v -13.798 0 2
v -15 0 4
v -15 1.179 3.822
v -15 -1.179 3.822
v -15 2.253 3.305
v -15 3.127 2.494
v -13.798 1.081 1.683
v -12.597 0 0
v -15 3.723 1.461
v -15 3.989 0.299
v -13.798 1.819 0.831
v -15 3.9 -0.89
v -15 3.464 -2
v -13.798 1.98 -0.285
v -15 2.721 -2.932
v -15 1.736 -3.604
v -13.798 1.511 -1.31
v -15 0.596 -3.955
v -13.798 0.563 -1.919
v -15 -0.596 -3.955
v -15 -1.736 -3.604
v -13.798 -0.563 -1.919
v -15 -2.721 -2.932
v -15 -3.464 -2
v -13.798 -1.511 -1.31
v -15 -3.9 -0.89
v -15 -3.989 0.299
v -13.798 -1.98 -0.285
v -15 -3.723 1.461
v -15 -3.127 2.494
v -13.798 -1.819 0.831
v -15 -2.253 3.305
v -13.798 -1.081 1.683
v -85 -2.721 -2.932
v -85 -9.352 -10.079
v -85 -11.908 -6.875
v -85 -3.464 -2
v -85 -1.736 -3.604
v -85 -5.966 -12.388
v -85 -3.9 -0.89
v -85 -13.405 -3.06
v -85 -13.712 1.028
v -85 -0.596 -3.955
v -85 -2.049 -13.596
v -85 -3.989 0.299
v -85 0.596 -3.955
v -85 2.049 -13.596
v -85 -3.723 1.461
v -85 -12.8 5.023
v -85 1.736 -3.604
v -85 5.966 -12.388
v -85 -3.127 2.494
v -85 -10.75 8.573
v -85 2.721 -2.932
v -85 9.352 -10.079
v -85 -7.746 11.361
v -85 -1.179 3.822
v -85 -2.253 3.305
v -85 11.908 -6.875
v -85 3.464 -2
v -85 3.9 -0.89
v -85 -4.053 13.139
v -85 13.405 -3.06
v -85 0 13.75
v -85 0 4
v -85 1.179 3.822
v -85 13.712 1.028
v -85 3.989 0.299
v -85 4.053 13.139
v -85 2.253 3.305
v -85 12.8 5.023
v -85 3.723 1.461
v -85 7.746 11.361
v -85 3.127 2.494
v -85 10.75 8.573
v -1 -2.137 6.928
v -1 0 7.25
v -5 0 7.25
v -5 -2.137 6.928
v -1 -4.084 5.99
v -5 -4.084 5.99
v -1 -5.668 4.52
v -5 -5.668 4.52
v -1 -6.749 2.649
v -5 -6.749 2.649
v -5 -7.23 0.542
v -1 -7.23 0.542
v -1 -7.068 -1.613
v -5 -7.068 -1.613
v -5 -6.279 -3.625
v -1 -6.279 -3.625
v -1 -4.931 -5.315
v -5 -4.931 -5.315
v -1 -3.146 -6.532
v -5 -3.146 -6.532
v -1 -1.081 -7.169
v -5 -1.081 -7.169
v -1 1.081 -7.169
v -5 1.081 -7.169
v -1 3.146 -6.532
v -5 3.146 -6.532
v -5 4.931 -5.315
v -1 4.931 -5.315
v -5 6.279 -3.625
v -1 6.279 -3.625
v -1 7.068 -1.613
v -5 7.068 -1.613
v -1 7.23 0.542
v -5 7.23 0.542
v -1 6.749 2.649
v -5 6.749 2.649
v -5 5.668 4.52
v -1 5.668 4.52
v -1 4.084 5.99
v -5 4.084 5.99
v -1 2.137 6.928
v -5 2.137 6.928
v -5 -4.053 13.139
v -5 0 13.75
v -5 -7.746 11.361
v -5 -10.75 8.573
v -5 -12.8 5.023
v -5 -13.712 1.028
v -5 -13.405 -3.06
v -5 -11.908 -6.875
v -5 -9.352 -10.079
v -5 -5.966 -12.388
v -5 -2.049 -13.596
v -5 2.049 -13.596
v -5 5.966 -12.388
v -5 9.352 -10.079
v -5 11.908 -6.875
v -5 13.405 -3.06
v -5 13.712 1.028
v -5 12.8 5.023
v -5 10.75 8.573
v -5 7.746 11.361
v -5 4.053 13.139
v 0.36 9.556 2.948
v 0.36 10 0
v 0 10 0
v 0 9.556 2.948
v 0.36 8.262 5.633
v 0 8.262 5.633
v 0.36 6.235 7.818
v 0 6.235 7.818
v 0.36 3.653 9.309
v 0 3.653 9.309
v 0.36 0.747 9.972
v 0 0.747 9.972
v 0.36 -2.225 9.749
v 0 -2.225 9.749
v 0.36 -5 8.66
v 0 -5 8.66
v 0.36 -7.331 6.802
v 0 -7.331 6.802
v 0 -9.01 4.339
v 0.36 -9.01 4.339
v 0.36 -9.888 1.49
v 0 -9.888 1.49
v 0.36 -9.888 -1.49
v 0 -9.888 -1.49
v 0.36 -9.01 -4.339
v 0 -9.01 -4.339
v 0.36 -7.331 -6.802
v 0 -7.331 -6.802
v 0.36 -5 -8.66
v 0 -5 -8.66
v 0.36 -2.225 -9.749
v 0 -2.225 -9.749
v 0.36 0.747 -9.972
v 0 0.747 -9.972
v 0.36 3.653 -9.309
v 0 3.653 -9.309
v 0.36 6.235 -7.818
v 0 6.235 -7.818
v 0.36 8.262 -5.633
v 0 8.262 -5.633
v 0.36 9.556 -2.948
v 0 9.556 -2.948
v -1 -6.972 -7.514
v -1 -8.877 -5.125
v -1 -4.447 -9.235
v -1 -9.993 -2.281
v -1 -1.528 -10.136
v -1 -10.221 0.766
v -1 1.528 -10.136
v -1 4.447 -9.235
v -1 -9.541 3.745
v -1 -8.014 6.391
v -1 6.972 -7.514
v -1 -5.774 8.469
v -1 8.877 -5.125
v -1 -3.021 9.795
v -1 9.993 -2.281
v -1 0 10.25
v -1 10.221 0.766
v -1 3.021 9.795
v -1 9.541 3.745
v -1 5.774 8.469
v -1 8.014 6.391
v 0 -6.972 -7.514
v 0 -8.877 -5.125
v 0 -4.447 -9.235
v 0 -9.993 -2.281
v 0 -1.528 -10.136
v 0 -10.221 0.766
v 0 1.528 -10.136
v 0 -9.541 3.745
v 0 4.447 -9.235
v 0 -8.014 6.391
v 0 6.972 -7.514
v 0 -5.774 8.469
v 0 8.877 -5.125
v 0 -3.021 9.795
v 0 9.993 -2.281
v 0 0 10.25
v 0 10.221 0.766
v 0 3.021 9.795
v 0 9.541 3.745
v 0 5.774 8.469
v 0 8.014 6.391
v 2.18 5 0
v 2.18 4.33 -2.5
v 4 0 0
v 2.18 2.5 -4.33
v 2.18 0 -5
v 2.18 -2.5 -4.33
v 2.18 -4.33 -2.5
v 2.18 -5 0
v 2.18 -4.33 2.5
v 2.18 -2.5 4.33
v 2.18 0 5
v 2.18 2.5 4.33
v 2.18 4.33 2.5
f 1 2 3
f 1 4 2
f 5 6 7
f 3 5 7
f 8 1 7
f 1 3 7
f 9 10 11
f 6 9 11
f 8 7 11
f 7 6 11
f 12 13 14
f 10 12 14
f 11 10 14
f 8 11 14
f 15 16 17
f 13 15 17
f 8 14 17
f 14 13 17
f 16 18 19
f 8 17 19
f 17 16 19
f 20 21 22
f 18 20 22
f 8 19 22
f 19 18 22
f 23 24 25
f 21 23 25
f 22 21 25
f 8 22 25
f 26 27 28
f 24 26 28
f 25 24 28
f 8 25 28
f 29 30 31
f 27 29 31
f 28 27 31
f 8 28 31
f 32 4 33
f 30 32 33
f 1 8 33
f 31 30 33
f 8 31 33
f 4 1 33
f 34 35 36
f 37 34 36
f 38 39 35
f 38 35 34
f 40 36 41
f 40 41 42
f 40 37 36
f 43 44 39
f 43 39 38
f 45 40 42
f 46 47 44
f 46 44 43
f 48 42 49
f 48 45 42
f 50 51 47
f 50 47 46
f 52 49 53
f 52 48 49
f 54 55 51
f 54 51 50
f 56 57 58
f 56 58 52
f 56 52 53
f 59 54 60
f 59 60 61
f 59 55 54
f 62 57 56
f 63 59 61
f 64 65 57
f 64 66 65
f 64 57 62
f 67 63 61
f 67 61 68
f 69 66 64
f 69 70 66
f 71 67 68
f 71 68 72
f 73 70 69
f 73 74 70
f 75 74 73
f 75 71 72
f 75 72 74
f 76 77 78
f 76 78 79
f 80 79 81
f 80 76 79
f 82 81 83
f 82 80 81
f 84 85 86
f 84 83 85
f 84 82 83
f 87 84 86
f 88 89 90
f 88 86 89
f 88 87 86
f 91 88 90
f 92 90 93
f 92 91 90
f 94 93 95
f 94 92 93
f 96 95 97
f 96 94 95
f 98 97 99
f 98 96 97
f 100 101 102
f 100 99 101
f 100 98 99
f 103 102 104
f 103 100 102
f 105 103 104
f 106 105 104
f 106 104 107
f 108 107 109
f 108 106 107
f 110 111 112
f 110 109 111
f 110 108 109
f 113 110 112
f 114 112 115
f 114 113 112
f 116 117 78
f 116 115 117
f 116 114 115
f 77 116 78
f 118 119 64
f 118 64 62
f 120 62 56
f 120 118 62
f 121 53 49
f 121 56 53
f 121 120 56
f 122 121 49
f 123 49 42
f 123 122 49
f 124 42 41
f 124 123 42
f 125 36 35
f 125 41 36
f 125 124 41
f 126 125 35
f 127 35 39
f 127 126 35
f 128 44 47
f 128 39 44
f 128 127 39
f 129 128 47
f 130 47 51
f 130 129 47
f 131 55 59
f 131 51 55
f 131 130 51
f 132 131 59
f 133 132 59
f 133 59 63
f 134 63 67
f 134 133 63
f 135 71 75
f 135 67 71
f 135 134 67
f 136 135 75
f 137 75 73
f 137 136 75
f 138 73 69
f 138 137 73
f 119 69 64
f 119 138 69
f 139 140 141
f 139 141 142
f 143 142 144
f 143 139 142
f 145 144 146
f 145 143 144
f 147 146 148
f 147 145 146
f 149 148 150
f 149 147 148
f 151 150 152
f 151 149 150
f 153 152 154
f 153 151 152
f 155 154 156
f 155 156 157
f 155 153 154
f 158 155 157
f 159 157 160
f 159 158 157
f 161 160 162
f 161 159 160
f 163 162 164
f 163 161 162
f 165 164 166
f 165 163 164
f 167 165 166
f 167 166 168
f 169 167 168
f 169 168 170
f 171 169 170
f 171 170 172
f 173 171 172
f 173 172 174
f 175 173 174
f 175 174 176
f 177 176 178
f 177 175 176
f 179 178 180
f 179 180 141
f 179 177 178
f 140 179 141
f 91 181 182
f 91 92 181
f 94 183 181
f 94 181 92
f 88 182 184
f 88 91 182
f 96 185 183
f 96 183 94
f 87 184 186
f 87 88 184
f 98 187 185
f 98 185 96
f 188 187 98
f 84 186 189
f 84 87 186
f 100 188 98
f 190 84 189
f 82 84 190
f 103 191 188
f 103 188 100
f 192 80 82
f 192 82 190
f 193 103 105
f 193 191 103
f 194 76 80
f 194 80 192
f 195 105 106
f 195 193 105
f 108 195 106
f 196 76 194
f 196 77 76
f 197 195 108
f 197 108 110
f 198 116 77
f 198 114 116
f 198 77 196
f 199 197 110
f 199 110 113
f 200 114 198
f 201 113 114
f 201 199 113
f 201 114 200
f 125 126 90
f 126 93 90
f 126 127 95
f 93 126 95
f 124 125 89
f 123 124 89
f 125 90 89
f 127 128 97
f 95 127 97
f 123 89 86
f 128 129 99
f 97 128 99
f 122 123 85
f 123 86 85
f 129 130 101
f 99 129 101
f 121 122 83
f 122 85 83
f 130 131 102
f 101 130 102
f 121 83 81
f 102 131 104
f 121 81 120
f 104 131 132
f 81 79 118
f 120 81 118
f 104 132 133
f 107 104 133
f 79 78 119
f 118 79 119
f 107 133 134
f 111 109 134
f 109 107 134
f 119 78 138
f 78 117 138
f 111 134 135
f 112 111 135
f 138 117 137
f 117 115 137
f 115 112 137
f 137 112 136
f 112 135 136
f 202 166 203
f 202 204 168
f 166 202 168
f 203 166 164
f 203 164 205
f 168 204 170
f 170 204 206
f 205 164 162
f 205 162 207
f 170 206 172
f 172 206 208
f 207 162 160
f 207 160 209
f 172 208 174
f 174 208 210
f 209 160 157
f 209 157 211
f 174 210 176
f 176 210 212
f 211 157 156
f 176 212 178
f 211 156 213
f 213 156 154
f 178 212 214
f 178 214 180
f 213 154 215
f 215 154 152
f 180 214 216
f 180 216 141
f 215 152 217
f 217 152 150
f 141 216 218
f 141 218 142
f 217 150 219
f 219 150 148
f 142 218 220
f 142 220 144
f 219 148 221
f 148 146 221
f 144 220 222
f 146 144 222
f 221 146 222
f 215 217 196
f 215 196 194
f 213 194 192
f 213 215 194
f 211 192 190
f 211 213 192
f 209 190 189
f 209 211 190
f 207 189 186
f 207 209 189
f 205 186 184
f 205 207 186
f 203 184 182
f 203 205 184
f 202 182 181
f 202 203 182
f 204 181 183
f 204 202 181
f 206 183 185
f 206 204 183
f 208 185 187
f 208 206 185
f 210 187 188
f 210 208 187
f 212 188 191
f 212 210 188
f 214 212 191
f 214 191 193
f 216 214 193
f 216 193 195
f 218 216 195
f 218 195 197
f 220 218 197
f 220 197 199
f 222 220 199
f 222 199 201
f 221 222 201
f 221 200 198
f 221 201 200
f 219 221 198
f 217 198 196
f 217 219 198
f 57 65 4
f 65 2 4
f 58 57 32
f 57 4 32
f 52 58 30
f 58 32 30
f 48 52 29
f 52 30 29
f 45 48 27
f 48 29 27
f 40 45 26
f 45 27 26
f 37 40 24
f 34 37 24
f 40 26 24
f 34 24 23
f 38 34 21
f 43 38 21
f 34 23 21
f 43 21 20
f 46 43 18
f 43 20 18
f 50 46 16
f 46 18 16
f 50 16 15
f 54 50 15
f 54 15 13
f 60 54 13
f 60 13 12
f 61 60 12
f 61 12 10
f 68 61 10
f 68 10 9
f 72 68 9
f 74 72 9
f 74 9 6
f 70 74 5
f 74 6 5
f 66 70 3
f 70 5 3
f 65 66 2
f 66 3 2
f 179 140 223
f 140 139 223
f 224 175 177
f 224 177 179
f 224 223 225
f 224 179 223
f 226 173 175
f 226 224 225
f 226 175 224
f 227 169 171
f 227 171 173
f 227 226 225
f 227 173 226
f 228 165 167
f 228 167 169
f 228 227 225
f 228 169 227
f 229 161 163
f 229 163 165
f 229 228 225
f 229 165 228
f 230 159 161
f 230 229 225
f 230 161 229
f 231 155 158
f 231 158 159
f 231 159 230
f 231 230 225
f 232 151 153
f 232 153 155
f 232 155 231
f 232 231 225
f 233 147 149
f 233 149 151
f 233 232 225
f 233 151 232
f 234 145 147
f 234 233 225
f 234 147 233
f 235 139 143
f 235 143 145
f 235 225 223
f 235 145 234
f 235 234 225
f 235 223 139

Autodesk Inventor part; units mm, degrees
ref_plane "YZ Plane" through (0, 0, 0) normal (1, 0, 0) x (0, 1, 0)
ref_plane "XZ Plane" through (0, 0, 0) normal (0, 1, 0) x (-1, 0, 0)
ref_plane "XY Plane" through (0, 0, 0) normal (0, 0, 1) x (1, 0, 0)
sketch "Sketch1" plane through (0, 0, 0) normal (0, 0, 1) x (1, 0, 0)
  line L0 (0, 0) -> (0, 10)
  line L1 (0, 0) -> (4, 0)
  line L2 (4, 0) -> (4, 20) construction
  line L3 (4, 0) -> (0.3603, 10)
  line L4 (0, 10) -> (0.3603, 10)
  line L5 (0, 0) -> (15.4124, 0)
  dimension "d0" = 10
  dimension "d1" = 20
  dimension "d2" = 4
  dimension "d3" = 11.4123
  dimension "d4" = 20
revolve "Revolution1" add sketch "Sketch1" angle 360 about axis through (0, 0, 0) along (1, 0, 0)
sketch "Sketch2" plane through (0, 0, 0) normal (-1, 0, 0) x (0, 0, 1)
  circle A0 centre (0, 0) radius 10.25
  dimension "d6" = 20.5
extrude "Extrusion1" add sketch "Sketch2" along normal blind 1
sketch "Sketch3" plane through (-1, 0, 0) normal (-1, 0, 0) x (0, 0, 1)
  circle A0 centre (0, 0) radius 7.25
  dimension "d9" = 14.5
extrude "Extrusion2" add sketch "Sketch3" along normal blind 4
sketch "Sketch4" plane through (-5, 0, 0) normal (-1, 0, 0) x (0, 0, 1)
  circle A0 centre (0, 0) radius 13.75
  dimension "d12" = 27.5
extrude "Extrusion3" add sketch "Sketch4" along normal blind 80
sketch "Sketch5" plane through (-85, 0, 0) normal (-1, 0, 0) x (0, 0, 1)
  point P0 (0, 0)
  point P1 (0, 0)
hole "Hole1" at (-85, 0, 0) direction (1, 0, 0) diameter 8 depth 70 tip angle 118
properties part number "Jeringa_coreV2"
